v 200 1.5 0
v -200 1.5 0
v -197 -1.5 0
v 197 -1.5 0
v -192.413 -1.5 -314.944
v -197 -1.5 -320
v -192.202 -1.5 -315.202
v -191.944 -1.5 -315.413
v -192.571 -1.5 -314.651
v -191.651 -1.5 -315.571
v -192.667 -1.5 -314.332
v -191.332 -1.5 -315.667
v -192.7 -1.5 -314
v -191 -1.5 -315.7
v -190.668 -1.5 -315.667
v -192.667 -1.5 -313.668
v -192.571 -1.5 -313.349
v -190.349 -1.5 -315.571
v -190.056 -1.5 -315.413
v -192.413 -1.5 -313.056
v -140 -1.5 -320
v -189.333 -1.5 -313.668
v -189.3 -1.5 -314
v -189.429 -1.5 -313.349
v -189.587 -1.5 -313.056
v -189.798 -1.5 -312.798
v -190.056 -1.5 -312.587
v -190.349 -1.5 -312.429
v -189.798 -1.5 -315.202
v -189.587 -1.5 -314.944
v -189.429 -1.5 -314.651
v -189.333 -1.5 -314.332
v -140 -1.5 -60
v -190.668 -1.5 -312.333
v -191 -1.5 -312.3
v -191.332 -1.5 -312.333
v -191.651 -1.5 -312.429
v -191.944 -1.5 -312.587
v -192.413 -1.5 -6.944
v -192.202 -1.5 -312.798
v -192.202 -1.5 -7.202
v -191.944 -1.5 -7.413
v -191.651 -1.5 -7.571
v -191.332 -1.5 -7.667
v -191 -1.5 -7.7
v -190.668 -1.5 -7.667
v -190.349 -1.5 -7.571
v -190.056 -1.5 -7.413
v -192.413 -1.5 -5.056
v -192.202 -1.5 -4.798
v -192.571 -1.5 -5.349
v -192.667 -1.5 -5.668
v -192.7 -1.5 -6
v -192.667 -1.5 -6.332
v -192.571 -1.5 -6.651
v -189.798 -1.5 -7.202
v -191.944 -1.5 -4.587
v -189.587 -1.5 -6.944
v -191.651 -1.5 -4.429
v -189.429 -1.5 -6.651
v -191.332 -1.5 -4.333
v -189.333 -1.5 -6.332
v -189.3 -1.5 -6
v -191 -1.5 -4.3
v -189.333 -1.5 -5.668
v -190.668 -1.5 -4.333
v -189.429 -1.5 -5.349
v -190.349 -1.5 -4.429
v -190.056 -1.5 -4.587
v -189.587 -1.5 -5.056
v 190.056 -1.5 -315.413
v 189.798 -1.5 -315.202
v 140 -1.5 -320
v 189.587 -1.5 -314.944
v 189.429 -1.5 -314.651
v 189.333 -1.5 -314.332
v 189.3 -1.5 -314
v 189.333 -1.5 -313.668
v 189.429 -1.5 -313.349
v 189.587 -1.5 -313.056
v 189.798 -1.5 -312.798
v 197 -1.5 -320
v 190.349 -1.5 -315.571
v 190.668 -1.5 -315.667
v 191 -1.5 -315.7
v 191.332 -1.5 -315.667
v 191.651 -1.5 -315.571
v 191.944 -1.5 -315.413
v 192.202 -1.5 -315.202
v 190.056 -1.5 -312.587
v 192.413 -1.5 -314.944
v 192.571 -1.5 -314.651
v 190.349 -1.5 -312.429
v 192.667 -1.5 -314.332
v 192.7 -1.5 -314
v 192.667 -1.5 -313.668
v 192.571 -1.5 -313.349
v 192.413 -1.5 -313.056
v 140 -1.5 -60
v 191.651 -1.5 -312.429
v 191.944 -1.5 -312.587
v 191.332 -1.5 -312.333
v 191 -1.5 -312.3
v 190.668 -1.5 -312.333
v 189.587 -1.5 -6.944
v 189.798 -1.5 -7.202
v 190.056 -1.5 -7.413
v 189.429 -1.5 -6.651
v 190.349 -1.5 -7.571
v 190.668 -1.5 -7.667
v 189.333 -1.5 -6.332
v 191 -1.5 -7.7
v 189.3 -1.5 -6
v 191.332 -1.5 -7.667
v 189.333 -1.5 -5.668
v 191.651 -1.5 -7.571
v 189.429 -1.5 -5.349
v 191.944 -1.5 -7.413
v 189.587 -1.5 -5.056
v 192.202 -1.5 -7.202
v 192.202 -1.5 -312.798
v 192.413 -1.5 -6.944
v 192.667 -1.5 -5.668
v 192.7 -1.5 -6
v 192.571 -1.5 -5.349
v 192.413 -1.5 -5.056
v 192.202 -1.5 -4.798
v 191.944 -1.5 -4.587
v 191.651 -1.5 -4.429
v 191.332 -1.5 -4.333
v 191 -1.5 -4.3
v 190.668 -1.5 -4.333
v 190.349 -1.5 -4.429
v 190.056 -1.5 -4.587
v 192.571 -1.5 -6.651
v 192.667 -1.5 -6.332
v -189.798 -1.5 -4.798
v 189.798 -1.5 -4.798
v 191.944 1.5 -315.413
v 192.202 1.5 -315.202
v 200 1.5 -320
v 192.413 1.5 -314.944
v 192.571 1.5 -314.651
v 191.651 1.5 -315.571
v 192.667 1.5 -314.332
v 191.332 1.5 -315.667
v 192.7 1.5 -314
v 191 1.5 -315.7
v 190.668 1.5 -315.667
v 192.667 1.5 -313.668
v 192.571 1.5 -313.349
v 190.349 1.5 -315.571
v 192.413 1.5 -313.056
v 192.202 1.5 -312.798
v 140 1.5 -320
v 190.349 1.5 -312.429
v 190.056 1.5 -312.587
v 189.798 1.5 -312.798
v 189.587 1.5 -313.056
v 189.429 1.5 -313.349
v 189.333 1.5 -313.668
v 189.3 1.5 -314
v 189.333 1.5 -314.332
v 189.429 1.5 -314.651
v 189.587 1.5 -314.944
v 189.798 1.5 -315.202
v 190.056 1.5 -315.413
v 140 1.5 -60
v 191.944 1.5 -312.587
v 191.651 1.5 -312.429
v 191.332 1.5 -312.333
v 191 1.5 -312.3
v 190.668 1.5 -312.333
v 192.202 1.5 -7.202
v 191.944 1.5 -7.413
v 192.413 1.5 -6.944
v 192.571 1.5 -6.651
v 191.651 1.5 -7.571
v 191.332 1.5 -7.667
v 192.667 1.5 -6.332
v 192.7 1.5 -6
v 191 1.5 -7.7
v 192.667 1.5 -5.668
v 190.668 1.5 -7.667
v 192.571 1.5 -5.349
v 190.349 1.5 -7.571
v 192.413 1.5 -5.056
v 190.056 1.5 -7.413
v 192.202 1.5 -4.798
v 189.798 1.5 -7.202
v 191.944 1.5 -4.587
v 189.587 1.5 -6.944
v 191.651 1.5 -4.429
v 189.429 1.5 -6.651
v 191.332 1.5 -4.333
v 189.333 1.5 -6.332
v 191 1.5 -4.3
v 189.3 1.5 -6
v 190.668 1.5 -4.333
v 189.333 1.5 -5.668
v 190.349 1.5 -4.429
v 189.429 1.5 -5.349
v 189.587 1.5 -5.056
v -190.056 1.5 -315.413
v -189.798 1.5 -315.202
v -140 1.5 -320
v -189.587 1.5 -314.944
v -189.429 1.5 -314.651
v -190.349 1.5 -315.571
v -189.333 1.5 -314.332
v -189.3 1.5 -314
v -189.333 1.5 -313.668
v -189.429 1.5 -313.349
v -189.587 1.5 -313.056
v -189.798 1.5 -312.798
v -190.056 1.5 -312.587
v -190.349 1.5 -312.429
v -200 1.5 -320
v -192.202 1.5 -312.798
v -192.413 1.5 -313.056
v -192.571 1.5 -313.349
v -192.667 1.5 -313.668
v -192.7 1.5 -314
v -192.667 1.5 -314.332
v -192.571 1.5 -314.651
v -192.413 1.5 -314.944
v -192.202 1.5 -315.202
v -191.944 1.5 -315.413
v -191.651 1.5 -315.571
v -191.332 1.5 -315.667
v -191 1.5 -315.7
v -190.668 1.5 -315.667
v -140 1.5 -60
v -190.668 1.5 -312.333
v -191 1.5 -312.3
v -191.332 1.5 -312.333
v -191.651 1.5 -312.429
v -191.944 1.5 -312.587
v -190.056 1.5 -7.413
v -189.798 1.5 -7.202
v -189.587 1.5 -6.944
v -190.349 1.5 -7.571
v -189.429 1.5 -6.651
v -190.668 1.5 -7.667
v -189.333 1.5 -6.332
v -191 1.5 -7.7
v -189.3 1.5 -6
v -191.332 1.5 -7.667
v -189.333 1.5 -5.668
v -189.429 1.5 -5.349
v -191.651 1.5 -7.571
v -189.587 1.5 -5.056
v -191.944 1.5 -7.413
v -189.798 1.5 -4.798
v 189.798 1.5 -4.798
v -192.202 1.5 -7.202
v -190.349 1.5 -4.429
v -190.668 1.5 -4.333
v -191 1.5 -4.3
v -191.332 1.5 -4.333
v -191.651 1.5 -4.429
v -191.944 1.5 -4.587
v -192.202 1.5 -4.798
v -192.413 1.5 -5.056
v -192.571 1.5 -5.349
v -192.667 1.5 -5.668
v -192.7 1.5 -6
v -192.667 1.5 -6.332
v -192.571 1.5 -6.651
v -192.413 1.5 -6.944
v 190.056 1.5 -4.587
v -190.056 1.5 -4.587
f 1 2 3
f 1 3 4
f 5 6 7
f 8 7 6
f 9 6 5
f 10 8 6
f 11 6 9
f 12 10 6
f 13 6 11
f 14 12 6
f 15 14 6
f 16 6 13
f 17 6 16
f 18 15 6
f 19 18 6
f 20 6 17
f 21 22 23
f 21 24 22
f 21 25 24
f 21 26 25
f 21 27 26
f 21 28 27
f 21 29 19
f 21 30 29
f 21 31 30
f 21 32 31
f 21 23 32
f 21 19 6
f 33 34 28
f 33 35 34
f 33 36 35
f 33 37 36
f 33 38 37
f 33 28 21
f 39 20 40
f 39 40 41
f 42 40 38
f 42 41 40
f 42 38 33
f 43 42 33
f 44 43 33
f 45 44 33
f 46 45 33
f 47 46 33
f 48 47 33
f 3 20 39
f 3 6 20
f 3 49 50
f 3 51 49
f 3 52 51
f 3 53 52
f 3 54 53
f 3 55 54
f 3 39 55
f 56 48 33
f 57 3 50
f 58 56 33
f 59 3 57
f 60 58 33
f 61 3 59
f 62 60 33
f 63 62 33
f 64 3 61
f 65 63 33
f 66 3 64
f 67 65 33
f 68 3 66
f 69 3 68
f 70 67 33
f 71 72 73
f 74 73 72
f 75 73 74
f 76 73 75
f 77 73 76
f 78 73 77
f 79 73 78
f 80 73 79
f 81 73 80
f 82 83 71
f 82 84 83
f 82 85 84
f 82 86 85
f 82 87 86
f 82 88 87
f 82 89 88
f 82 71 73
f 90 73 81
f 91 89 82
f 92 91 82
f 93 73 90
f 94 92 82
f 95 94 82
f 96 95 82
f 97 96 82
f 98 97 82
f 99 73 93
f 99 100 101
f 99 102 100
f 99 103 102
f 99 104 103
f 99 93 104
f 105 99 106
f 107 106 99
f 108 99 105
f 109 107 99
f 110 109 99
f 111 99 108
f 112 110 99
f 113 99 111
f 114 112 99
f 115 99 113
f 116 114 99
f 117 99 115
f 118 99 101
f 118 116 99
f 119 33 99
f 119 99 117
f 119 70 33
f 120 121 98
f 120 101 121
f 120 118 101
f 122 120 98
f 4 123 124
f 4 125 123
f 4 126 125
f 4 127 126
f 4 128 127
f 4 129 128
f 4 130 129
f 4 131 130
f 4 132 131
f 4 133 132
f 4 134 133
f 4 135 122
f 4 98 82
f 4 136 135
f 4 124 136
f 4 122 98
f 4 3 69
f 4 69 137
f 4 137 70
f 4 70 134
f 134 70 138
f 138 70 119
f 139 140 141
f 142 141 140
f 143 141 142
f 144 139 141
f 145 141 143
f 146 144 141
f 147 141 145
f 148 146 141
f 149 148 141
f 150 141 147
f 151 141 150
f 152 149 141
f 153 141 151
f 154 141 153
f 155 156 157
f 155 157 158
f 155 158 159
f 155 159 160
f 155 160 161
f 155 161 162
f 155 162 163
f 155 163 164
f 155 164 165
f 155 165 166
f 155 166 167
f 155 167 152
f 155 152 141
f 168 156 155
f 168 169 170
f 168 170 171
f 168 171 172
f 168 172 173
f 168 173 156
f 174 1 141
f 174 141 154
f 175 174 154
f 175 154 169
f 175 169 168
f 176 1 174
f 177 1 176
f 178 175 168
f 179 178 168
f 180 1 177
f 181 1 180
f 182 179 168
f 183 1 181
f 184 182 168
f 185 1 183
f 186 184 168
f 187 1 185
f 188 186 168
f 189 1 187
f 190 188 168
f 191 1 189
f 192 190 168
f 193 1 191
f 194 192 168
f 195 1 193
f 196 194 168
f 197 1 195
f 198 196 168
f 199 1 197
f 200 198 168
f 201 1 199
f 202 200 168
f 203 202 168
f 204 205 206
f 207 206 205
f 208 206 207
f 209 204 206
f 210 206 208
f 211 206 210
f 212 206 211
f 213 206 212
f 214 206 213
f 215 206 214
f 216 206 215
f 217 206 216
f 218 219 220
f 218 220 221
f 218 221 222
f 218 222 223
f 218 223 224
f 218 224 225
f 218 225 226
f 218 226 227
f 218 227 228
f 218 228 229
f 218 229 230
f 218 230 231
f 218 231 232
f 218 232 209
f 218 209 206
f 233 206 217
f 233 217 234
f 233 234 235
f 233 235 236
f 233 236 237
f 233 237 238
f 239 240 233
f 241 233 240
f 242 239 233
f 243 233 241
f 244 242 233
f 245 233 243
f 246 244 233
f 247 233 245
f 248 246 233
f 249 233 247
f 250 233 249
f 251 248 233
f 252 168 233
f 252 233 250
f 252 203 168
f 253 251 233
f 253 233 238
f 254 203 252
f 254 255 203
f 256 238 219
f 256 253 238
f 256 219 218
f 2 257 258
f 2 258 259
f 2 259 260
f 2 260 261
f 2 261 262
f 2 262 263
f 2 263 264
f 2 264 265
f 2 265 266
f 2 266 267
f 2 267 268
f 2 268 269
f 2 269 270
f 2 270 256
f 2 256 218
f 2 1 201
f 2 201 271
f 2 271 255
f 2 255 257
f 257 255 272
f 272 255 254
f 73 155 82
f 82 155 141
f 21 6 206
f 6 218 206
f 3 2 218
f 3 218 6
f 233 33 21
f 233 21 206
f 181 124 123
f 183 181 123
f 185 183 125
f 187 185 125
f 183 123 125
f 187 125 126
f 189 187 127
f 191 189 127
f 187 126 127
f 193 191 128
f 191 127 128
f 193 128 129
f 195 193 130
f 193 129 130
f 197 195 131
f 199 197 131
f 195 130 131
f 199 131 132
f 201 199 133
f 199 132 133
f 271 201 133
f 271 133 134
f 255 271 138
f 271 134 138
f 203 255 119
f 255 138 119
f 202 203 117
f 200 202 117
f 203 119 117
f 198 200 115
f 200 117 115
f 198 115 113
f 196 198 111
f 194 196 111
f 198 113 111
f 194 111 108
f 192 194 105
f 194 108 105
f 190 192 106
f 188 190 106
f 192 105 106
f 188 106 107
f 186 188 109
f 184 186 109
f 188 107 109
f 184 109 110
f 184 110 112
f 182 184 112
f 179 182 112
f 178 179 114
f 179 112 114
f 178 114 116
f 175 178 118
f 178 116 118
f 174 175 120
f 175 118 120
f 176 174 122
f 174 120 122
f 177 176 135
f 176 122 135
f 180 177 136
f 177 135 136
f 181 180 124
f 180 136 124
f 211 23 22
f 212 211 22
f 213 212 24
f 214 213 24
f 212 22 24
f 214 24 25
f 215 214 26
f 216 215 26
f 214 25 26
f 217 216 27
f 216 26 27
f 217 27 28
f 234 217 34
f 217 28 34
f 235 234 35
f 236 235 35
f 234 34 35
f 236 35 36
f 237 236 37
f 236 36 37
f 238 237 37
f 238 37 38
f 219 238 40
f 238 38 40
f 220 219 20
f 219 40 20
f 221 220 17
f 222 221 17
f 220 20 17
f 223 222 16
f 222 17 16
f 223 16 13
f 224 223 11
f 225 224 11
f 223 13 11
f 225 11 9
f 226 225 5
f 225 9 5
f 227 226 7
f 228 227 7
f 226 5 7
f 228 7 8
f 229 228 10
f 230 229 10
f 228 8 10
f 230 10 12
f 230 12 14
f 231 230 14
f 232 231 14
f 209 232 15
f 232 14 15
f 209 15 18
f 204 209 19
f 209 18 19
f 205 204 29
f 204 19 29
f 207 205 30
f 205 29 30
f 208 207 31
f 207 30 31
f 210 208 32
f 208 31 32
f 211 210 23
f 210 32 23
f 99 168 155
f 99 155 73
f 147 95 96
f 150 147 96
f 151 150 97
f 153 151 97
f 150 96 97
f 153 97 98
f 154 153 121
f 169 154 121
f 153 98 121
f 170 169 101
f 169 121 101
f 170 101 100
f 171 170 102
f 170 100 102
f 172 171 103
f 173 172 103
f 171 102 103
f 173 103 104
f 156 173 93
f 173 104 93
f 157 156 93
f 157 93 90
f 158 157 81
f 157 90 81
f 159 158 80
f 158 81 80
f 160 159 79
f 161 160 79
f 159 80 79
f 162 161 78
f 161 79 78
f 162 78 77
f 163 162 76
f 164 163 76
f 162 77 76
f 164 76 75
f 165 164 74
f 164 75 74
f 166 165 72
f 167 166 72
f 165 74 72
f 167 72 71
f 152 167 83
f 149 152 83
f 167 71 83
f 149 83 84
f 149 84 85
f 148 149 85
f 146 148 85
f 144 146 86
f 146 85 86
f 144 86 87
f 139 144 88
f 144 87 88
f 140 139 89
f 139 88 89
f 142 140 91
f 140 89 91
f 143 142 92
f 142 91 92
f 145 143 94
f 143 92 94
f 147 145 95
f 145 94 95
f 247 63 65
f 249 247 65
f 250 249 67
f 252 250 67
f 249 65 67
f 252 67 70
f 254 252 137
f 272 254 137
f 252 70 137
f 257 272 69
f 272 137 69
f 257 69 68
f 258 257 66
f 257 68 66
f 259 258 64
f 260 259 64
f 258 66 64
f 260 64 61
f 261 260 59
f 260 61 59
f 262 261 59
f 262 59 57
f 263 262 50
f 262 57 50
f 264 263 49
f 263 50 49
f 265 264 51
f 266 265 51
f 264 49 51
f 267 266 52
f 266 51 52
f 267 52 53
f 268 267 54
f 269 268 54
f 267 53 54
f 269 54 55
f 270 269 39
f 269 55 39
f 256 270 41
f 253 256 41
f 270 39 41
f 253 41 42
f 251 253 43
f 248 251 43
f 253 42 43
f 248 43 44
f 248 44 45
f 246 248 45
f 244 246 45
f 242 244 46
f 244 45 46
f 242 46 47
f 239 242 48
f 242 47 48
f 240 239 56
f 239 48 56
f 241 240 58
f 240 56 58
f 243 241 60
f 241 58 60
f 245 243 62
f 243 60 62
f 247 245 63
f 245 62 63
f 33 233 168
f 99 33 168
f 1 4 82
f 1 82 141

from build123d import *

# Parameters (mm, degrees)
F1_DEPTH = 60
F2_DEPTH = 320
F3_R     = 1.7
F4_DEPTH = 3


with BuildPart() as f1:
    # F0 (on Top) → F1 (new body)
    with BuildSketch(Plane.XY):
        Polygon((140, 1.5), (0, 1.5), (-140, 1.5), (-140, 0), (-140, -1.5), (0, -1.5), (140, -1.5), (140, 0), align=None)
    extrude(amount=-F1_DEPTH)

    # F0 (on Top) → F2 (join)
    with BuildSketch(Plane.XY):
        Polygon((-140, 0), (-140, 1.5), (-200, 1.5), (-197, -1.5), (-140, -1.5), align=None)
        Polygon((200, 1.5), (140, 1.5), (140, 0), (140, -1.5), (197, -1.5), align=None)
    extrude(amount=-F2_DEPTH)

    # F3 (on face) → F4 (cut)
    with BuildSketch(Plane.XZ.offset(1.5)):
        with Locations((191, -6)):
            Circle(F3_R)
        with Locations((191, -314)):
            Circle(F3_R)
        with Locations((-191, -314)):
            Circle(F3_R)
        with Locations((-191, -6)):
            Circle(F3_R)
    extrude(amount=-F4_DEPTH, mode=Mode.SUBTRACT)


solid = f1.part
